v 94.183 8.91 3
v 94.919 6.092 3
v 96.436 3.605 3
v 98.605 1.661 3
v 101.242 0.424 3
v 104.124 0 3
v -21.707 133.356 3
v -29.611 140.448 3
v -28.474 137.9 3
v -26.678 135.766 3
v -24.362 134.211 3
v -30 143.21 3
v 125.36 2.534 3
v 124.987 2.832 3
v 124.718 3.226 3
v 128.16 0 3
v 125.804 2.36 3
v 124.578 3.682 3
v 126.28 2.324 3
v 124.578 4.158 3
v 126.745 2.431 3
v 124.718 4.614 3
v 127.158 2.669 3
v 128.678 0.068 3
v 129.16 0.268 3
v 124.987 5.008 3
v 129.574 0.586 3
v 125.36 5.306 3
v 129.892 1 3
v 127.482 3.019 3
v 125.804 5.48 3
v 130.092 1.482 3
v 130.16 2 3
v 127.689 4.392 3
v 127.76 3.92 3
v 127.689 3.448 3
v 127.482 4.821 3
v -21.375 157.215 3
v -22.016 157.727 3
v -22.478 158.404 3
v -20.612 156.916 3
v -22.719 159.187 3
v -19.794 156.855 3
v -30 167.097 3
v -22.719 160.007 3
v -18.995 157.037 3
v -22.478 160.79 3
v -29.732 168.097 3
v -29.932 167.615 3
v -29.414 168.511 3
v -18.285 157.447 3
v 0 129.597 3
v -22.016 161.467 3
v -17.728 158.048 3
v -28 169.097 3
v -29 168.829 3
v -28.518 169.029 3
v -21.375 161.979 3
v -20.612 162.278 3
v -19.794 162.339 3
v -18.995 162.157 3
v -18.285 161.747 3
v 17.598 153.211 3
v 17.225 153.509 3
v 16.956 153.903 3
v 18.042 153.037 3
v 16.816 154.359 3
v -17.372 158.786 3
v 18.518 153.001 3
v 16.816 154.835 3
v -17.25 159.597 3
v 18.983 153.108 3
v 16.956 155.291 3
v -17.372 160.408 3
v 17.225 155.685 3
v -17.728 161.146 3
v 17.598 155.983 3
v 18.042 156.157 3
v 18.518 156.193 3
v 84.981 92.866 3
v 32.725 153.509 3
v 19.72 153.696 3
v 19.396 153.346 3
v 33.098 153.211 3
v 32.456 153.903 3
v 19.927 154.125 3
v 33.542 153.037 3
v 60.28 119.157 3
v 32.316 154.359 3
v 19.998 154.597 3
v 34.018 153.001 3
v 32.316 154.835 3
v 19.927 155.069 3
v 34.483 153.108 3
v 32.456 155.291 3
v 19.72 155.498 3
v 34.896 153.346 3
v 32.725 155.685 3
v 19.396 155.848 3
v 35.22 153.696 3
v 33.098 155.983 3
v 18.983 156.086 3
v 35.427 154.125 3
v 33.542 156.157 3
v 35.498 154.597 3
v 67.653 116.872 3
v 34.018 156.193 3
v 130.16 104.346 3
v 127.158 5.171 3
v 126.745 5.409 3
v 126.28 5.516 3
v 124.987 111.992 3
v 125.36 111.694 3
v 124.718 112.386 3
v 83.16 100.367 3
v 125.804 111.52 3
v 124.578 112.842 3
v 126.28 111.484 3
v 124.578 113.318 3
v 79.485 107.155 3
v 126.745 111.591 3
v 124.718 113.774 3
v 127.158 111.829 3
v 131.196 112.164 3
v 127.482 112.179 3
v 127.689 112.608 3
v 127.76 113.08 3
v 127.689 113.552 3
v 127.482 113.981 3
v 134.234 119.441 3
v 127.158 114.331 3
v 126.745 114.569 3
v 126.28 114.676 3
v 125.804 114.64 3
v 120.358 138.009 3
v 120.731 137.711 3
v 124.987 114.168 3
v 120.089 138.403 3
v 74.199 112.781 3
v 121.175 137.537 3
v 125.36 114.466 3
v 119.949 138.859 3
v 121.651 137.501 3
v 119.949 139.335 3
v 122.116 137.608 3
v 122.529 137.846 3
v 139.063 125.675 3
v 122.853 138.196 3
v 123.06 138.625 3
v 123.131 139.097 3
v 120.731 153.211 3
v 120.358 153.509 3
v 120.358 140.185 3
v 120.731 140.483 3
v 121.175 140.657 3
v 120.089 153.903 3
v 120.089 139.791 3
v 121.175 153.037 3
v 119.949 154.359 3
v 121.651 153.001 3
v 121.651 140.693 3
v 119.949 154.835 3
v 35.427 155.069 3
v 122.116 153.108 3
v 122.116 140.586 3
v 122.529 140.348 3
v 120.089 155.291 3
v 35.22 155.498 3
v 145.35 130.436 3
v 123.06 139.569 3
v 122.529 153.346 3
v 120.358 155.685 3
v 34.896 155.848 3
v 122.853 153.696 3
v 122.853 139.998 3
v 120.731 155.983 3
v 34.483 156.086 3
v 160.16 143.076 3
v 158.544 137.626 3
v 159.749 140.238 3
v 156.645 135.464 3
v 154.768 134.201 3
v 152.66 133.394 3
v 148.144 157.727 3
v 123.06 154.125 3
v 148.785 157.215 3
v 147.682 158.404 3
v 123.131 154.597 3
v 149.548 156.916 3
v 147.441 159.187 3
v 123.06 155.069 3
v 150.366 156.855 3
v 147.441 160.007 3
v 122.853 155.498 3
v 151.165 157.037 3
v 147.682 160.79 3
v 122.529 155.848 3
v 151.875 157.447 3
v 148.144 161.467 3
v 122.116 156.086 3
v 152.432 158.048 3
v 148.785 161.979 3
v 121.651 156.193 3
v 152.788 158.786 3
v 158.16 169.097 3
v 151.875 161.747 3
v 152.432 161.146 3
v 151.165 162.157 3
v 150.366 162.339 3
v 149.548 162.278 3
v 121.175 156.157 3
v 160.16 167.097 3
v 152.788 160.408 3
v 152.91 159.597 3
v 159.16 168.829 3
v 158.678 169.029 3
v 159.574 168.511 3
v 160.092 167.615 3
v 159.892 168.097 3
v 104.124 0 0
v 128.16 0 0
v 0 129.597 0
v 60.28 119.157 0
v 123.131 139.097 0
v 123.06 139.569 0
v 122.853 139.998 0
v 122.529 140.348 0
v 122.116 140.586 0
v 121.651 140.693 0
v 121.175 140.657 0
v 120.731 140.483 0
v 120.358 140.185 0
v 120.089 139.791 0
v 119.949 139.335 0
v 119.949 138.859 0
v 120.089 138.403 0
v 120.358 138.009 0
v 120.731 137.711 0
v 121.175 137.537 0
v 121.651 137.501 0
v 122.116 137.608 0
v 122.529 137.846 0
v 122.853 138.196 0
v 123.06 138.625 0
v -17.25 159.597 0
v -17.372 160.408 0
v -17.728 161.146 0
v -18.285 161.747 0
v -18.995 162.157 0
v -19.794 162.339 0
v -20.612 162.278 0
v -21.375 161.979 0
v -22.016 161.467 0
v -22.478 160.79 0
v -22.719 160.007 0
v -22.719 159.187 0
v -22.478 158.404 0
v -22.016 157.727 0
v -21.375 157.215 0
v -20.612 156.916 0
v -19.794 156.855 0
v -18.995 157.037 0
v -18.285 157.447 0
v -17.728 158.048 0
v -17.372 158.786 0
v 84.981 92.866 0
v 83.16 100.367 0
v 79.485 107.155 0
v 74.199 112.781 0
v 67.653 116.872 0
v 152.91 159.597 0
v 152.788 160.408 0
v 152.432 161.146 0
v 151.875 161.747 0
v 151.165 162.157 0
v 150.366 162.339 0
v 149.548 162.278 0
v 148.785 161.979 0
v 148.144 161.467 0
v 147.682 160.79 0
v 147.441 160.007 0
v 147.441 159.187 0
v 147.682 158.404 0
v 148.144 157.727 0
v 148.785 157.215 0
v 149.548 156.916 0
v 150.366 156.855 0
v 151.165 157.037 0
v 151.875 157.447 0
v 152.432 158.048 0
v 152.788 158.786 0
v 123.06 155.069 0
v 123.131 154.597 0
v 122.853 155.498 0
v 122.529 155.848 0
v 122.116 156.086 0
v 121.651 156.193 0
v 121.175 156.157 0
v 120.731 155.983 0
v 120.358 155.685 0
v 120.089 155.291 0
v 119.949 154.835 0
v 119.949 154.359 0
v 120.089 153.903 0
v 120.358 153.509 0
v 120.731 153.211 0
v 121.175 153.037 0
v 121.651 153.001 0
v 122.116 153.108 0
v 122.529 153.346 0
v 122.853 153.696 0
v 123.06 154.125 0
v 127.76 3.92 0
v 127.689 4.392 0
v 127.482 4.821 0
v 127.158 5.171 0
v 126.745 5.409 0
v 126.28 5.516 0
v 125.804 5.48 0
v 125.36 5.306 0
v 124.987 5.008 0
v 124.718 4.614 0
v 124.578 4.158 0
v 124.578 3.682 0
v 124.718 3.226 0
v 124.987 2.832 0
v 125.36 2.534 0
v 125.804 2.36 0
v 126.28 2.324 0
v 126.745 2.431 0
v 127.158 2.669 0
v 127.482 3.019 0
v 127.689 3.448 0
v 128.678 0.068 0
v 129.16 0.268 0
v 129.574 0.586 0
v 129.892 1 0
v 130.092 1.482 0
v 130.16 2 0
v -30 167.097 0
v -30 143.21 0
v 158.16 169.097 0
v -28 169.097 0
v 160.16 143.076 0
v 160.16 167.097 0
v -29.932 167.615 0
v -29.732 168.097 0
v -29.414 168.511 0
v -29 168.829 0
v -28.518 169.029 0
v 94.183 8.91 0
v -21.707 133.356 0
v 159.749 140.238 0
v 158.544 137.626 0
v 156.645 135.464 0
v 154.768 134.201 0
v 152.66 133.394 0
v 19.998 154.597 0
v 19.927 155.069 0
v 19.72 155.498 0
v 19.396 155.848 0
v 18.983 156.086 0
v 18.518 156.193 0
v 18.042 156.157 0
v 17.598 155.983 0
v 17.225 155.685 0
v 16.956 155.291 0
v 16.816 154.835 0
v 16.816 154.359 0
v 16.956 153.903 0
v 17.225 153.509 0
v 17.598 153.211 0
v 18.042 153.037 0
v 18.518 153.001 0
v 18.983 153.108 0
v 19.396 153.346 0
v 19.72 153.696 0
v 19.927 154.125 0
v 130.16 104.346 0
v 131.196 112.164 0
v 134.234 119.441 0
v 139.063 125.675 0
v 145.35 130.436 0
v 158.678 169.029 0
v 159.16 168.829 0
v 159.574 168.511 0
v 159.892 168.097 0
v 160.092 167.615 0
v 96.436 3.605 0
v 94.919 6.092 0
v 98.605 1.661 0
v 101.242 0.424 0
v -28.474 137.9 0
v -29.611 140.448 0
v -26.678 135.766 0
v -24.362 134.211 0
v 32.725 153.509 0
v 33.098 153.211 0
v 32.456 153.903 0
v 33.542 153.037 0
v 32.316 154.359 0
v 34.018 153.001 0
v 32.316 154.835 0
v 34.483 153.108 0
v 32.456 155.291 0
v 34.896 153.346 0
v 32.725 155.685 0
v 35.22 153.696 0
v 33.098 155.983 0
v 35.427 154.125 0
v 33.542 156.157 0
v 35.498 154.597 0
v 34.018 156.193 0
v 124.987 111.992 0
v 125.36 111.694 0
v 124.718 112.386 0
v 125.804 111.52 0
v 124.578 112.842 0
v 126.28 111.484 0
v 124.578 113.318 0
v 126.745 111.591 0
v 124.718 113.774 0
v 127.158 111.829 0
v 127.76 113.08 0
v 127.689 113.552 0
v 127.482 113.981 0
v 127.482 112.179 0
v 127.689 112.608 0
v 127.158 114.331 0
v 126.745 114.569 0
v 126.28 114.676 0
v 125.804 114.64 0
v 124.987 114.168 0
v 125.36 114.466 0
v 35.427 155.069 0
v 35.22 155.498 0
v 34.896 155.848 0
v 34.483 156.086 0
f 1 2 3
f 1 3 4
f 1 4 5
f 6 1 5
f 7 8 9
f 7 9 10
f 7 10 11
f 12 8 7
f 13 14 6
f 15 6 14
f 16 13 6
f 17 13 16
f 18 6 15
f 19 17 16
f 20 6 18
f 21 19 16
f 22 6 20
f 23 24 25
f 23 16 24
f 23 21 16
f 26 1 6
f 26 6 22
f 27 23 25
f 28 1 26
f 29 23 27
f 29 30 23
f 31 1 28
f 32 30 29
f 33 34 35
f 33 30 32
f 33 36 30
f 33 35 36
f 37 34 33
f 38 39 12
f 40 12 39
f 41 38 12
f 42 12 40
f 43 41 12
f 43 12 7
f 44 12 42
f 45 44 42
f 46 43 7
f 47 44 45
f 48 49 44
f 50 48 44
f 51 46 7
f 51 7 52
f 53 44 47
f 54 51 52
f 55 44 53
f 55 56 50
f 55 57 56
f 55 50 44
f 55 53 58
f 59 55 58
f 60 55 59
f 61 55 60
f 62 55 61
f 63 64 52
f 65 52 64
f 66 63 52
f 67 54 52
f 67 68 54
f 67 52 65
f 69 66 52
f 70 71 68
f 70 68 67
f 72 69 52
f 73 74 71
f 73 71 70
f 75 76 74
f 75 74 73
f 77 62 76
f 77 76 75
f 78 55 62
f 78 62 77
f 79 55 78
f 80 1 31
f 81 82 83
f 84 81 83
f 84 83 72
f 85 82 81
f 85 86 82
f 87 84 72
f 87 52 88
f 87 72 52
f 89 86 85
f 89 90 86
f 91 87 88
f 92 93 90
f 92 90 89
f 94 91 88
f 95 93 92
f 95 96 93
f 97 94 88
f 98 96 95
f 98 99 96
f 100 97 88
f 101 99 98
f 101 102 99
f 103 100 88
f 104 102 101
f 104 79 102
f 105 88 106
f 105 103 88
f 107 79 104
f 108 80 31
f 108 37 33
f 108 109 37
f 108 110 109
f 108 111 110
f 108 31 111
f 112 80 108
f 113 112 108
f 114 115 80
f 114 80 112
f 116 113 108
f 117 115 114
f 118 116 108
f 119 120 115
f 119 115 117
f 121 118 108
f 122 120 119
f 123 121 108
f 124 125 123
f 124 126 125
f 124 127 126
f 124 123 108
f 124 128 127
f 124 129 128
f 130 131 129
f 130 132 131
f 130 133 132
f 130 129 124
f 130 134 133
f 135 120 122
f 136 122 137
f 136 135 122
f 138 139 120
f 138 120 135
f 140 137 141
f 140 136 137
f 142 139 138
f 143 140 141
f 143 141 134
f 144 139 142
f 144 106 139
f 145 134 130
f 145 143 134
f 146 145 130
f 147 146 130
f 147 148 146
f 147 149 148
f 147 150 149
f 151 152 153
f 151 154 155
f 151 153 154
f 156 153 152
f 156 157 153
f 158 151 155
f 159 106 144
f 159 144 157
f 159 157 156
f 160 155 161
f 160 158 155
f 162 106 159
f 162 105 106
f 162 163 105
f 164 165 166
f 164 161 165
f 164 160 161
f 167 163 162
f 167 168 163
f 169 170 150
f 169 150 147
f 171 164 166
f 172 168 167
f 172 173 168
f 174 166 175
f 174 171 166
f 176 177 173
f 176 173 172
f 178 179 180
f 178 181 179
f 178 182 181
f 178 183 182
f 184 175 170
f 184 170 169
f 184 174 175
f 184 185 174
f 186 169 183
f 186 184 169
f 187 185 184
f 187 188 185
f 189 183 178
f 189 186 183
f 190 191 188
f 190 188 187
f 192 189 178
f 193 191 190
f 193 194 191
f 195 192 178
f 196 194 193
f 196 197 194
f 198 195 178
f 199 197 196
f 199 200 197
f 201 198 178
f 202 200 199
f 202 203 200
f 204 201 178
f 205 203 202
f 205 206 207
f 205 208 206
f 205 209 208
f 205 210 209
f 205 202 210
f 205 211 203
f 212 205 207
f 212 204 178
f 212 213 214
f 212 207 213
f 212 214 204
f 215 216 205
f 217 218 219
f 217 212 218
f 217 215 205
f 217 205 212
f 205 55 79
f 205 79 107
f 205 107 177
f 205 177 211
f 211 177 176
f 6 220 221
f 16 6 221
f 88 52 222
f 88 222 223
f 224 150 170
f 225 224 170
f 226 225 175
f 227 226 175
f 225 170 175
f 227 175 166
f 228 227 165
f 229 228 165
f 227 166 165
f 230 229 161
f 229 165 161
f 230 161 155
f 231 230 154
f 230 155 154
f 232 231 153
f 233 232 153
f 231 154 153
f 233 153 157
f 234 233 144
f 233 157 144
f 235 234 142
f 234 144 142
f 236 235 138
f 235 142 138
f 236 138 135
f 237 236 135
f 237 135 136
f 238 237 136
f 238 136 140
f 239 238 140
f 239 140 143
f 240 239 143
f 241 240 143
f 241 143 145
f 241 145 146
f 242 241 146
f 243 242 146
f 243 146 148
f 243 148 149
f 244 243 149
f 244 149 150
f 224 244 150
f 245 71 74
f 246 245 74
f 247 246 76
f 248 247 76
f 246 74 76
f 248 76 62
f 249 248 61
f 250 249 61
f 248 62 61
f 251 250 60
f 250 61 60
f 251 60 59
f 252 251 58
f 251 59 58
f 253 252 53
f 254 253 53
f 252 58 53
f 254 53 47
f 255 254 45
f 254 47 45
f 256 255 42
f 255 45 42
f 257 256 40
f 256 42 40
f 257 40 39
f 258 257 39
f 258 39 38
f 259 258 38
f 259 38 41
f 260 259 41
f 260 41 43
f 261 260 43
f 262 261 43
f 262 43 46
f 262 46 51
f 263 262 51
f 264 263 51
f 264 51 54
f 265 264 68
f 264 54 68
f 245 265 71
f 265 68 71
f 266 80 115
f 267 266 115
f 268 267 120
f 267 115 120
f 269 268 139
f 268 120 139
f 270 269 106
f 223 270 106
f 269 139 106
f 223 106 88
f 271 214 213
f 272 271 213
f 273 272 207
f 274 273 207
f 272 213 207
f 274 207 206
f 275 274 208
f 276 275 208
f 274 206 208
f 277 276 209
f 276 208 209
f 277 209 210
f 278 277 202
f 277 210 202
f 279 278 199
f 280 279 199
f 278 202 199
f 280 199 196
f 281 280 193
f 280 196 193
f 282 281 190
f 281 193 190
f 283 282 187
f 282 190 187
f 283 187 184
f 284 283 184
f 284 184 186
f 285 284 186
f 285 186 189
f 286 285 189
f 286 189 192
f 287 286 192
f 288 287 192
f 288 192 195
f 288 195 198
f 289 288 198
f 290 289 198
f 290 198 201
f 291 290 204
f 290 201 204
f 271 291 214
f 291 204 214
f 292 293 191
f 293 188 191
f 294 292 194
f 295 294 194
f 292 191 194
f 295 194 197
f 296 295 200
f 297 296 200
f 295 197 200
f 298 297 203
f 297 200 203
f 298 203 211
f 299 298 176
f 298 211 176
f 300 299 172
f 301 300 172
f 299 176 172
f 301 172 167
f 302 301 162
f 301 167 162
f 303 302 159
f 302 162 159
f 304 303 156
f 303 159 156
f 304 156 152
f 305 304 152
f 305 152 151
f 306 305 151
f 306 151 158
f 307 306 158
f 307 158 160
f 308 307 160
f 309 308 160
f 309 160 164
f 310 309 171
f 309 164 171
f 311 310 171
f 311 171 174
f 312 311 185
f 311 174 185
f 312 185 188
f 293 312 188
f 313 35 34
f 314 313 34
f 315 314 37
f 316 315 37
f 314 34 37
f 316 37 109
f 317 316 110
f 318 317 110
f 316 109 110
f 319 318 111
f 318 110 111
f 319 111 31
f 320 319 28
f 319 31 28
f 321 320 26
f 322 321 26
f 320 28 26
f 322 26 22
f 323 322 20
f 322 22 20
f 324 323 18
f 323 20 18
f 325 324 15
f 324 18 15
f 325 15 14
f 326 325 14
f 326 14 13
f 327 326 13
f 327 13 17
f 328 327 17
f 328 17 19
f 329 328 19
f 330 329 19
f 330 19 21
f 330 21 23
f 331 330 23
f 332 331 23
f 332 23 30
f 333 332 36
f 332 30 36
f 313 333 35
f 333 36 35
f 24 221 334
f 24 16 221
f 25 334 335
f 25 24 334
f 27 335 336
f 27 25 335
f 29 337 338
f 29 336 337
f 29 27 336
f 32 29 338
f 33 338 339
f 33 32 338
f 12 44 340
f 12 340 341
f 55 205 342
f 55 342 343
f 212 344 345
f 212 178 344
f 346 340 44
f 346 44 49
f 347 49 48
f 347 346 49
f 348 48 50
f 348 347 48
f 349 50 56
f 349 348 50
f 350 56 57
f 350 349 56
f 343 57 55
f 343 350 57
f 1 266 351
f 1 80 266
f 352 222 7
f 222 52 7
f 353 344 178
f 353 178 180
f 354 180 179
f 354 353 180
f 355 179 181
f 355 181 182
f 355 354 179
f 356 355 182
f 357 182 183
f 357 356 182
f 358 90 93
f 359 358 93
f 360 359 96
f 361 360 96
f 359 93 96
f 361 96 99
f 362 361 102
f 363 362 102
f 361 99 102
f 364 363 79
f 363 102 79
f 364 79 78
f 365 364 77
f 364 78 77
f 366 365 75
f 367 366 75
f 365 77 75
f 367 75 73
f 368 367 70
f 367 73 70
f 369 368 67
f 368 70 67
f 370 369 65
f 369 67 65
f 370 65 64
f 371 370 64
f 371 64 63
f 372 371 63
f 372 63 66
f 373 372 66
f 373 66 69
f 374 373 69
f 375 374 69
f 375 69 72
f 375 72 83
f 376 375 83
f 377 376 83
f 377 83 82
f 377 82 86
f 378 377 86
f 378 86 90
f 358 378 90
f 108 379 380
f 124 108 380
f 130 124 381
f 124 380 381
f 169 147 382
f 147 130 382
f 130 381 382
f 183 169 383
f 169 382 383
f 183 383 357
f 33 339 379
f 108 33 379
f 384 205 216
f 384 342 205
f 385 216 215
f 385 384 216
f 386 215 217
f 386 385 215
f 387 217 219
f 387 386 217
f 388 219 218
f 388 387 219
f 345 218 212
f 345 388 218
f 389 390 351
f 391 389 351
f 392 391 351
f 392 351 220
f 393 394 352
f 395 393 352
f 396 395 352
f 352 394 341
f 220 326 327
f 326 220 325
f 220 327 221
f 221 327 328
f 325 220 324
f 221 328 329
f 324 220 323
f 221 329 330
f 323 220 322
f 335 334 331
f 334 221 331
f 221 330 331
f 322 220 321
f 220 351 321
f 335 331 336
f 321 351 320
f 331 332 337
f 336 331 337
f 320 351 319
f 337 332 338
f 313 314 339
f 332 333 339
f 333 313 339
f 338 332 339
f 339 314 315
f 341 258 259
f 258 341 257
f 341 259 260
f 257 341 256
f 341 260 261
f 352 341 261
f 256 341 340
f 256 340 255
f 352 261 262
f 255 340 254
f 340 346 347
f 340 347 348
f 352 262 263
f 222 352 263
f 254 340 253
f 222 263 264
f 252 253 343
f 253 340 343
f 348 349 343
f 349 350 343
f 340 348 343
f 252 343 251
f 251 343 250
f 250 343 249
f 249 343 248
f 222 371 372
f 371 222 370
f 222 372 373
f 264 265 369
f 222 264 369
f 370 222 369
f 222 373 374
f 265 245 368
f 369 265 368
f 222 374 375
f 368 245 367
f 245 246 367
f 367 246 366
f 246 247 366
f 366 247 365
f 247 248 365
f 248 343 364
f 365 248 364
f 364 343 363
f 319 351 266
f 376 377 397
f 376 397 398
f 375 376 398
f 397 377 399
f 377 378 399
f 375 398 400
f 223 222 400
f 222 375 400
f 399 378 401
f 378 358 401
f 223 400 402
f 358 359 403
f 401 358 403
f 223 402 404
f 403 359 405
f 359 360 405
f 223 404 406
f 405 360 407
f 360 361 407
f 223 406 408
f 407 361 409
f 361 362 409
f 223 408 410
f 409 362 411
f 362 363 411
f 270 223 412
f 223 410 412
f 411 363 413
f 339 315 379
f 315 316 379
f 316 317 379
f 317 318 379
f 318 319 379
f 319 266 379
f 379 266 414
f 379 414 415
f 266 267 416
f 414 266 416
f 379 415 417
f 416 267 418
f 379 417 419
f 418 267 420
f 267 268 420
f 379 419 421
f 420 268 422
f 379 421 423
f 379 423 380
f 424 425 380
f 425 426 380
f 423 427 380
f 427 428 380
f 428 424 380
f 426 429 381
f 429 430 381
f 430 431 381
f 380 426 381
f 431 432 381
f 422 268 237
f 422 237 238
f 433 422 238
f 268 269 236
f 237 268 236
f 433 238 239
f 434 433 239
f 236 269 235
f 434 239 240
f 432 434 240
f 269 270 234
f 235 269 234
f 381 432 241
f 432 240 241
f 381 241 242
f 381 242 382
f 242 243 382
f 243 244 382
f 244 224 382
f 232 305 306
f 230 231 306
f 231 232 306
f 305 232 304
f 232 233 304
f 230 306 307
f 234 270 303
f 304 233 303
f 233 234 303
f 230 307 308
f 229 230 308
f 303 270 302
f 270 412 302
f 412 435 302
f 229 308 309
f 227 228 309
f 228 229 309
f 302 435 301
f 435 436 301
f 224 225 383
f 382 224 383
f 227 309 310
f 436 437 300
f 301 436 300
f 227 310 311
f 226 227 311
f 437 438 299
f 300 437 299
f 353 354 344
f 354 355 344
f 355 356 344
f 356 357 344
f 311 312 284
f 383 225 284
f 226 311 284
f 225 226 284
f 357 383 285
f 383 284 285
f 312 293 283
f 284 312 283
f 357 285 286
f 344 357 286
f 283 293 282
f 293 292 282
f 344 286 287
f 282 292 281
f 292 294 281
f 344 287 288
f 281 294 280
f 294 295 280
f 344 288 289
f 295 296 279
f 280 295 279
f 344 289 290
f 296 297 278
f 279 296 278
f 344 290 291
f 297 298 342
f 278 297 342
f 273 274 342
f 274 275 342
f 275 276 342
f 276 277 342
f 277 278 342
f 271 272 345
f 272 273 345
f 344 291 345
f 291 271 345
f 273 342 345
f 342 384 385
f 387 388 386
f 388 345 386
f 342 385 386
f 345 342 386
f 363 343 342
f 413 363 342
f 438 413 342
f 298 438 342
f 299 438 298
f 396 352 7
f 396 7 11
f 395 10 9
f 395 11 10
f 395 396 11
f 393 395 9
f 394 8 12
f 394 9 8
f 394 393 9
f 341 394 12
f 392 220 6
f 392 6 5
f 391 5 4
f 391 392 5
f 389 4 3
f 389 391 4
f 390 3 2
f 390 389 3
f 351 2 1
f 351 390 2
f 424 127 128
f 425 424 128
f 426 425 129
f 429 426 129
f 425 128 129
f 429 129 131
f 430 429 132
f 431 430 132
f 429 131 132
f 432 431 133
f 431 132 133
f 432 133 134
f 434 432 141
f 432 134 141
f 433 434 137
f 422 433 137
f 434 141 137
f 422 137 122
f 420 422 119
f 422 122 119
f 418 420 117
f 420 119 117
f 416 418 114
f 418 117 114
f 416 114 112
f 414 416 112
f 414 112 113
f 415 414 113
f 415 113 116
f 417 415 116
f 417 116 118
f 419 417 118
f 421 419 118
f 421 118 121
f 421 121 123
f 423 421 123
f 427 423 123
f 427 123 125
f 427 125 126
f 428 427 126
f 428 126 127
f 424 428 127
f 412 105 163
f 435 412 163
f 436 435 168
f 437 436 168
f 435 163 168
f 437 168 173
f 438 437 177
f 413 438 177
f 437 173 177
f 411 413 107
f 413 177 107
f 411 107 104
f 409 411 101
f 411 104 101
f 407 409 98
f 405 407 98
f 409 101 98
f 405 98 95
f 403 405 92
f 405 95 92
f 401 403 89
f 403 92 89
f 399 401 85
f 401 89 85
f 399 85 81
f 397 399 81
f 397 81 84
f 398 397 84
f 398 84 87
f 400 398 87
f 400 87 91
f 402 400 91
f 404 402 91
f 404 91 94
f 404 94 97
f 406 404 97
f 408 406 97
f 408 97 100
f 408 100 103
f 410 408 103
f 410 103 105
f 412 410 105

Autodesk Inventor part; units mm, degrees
ref_plane "YZ Plane" through (0, 0, 0) normal (1, 0, 0) x (0, 1, 0)
ref_plane "XZ Plane" through (0, 0, 0) normal (0, 1, 0) x (-1, 0, 0)
ref_plane "XY Plane" through (0, 0, 0) normal (0, 0, 1) x (1, 0, 0)
sketch "スケッチ1" plane through (0, 0, 0) normal (0, 0, 1) x (1, 0, 0)
  line L0 (0, 0) -> (130.16, 0)
  line L1 (130.16, 0) -> (130.16, 159.597)
  line L2 (130.16, 159.597) -> (0, 159.597)
  line L3 (0, 159.597) -> (0, 0)
  dimension "d0" = 130.16
  dimension "d1" = 159.597
extrude "押し出し1" add sketch "スケッチ1" along normal blind 3
sketch "スケッチ2" plane through (0, 0, 3) normal (0, 0, 1) x (1, 0, 0)
  line L0 (126.16, 3.92) -> (126.16, 113.08) construction
  circle A0 centre (126.16, 3.92) radius 1.6
  circle A1 centre (126.16, 113.08) radius 1.6
  line L1 (130.16, 0) -> (130.16, 159.597) projected
  line L2 (0, 0) -> (130.16, 0) projected
  circle A2 centre (121.531, 154.597) radius 1.6
  line L3 (130.16, 159.597) -> (0, 159.597) projected
  line L4 (121.531, 154.597) -> (121.531, 139.097) construction
  circle A3 centre (121.531, 139.097) radius 1.6
  line L5 (18.398, 154.597) -> (33.898, 154.597) construction
  line L6 (0, 159.597) -> (0, 0) construction
  circle A4 centre (18.398, 154.597) radius 1.6
  circle A5 centre (33.898, 154.597) radius 1.6
  dimension "d4" = 3.2
  dimension "d5" = 4
  dimension "d6" = 3.92
  dimension "d7" = 109.16
  dimension "d10" = 5
  dimension "d11" = 8.629
  dimension "d12" = 15.5
  dimension "d13" = 18.398
  dimension "d14" = 5
  dimension "d15" = 15.5
extrude "押し出し2" cut sketch "スケッチ2" against normal blind 3
sketch "スケッチ4" plane through (0, 0, 3) normal (0, 0, 1) x (1, 0, 0)
  line L0 (130.16, 159.597) -> (0, 159.597) construction
  line L1 (130.16, 0) -> (130.16, 159.597) construction
  line L2 (0, 159.597) -> (0, 0) construction
  line L3 (0, 159.597) -> (-30, 159.597)
  line L4 (-30, 159.597) -> (-30, 129.597)
  line L5 (-30, 129.597) -> (0, 129.597)
  line L6 (0, 129.597) -> (0, 159.597)
  line L7 (130.16, 159.597) -> (160.16, 159.597)
  line L8 (160.16, 159.597) -> (160.16, 129.597)
  line L9 (160.16, 129.597) -> (130.16, 129.597)
  line L10 (130.16, 129.597) -> (130.16, 159.597)
  circle A0 centre (-20, 149.597) radius 2.75
  circle A1 centre (150.16, 149.597) radius 2.75
  dimension "d23" = 30
  dimension "d24" = 30
  dimension "d26" = 10
  dimension "d27" = 10
  dimension "d28" = 10
  dimension "d29" = 10
  dimension "d30" = 5.5
extrude "押し出し4" add sketch "スケッチ4" against normal blind 3
sketch "スケッチ3" plane through (0, 0, 3) normal (0, 0, 1) x (1, 0, 0)
  circle A0 centre (55.16, 89.597) radius 30 construction
  line L0 (0, 159.597) -> (0, 0) construction
  line L1 (0, 129.597) -> (60.2796, 119.1569)
  line L2 (84.9814, 92.8656) -> (95.16, 0)
  line L3 (0, 0) -> (130.16, 0) construction
  line L4 (130.16, 159.597) -> (0, 159.597) construction
  line L5 (130.16, 0) -> (130.16, 159.597) construction
  arc A1 (84.9814, 92.8656) -> (60.2796, 119.1569) centre (55.16, 89.597) ccw
  line L6 (0, 129.597) -> (0, 0)
  line L7 (0, 0) -> (95.16, 0)
  dimension "d16" = 30
  dimension "d17" = 35
  dimension "d18" = 70
  dimension "d19" = 75
  dimension "d20" = 60
extrude "押し出し3" cut sketch "スケッチ3" against normal blind 3
sketch "スケッチ5" plane through (0, 0, 3) normal (0, 0, 1) x (1, 0, 0)
  line L0 (-30, 159.597) -> (160.16, 159.597) construction
  line L1 (65.08, 159.597) -> (65.08, 0) construction
  line L2 (0, 129.597) -> (60.2796, 119.1569) construction
  line L3 (0, 129.597) -> (-30, 134.7928)
  line L4 (-30, 134.7928) -> (-30, 129.597)
  line L5 (-30, 129.597) -> (0, 129.597)
  line L6 (130.16, 129.597) -> (160.16, 134.7928)
  line L7 (160.16, 134.7928) -> (160.16, 129.597)
  line L8 (160.16, 129.597) -> (130.16, 129.597)
  point P0 (0, 0)
extrude "押し出し5" cut sketch "スケッチ5" against normal blind 3
fillet "フィレット1" radius 30 1 edges at (130.16, 129.597, 1.5)
sketch "スケッチ6" plane through (0, 0, 3) normal (0, 0, 1) x (1, 0, 0)
  line L0 (-30, 159.597) -> (160.16, 159.597) construction
  line L1 (-30, 159.597) -> (-30, 134.7928) projected
  line L2 (-30, 159.597) -> (160.16, 159.597)
  line L3 (160.16, 159.597) -> (160.16, 169.597)
  line L4 (160.16, 169.597) -> (-30, 169.597)
  line L5 (-30, 169.597) -> (-30, 159.597)
  line L6 (160.16, 159.597) -> (160.16, 134.7928) projected
  point P0 (0, 0)
  dimension "d38" = 10
extrude "押し出し6" add sketch "スケッチ6" against normal blind 3
sketch "スケッチ7" plane through (0, 0, 3) normal (0, 0, 1) x (1, 0, 0)
  circle A0 centre (-20, 149.597) radius 2.75 construction
  circle A1 centre (150.16, 149.597) radius 2.75 construction
  line L0 (-20, 149.597) -> (-20, 159.597) construction
  circle A2 centre (-20, 159.597) radius 2.75
  line L1 (150.16, 149.597) -> (150.16, 159.597) construction
  circle A3 centre (150.16, 159.597) radius 2.75
  point P0 (0, 0)
  dimension "d41" = 10
extrude "押し出し7" cut sketch "スケッチ7" against normal blind 3
sketch "スケッチ8" plane through (0, 0, 3) normal (0, 0, 1) x (1, 0, 0)
  circle A0 centre (-20, 149.597) radius 2.75 projected
  circle A1 centre (150.16, 149.597) radius 2.75 projected
  point P0 (0, 0)
extrude "押し出し8" add sketch "スケッチ8" against normal blind 3
fillet "フィレット2" radius 10 3 edges at (-30, 134.7928, 1.5) (160.16, 134.7928, 1.5) (95.16, 0, 1.5)
fillet "フィレット2" radius 2 1 edges at (130.16, 0, 1.5)
sketch "スケッチ9" plane through (0, 0, 3) normal (0, 0, 1) x (1, 0, 0)
  line L0 (160.16, 169.597) -> (-30, 169.597) projected
  line L1 (160.16, 143.076) -> (160.16, 169.597) projected
  line L2 (-30, 169.597) -> (160.16, 169.597)
  line L3 (160.16, 169.597) -> (160.16, 169.097)
  line L4 (160.16, 169.097) -> (-30, 169.097)
  line L5 (-30, 169.097) -> (-30, 169.597)
  point P0 (0, 0)
  dimension "d46" = 0.5
extrude "押し出し9" cut sketch "スケッチ9" against normal blind 3
fillet "フィレット3" radius 2 2 edges at (-30, 169.097, 1.5) (160.16, 169.097, 1.5)
equation "\"d28\" = d26"
equation "\"d29\" = d27"
properties part number "small_gpu_04" material "アルミニウム 6061"
